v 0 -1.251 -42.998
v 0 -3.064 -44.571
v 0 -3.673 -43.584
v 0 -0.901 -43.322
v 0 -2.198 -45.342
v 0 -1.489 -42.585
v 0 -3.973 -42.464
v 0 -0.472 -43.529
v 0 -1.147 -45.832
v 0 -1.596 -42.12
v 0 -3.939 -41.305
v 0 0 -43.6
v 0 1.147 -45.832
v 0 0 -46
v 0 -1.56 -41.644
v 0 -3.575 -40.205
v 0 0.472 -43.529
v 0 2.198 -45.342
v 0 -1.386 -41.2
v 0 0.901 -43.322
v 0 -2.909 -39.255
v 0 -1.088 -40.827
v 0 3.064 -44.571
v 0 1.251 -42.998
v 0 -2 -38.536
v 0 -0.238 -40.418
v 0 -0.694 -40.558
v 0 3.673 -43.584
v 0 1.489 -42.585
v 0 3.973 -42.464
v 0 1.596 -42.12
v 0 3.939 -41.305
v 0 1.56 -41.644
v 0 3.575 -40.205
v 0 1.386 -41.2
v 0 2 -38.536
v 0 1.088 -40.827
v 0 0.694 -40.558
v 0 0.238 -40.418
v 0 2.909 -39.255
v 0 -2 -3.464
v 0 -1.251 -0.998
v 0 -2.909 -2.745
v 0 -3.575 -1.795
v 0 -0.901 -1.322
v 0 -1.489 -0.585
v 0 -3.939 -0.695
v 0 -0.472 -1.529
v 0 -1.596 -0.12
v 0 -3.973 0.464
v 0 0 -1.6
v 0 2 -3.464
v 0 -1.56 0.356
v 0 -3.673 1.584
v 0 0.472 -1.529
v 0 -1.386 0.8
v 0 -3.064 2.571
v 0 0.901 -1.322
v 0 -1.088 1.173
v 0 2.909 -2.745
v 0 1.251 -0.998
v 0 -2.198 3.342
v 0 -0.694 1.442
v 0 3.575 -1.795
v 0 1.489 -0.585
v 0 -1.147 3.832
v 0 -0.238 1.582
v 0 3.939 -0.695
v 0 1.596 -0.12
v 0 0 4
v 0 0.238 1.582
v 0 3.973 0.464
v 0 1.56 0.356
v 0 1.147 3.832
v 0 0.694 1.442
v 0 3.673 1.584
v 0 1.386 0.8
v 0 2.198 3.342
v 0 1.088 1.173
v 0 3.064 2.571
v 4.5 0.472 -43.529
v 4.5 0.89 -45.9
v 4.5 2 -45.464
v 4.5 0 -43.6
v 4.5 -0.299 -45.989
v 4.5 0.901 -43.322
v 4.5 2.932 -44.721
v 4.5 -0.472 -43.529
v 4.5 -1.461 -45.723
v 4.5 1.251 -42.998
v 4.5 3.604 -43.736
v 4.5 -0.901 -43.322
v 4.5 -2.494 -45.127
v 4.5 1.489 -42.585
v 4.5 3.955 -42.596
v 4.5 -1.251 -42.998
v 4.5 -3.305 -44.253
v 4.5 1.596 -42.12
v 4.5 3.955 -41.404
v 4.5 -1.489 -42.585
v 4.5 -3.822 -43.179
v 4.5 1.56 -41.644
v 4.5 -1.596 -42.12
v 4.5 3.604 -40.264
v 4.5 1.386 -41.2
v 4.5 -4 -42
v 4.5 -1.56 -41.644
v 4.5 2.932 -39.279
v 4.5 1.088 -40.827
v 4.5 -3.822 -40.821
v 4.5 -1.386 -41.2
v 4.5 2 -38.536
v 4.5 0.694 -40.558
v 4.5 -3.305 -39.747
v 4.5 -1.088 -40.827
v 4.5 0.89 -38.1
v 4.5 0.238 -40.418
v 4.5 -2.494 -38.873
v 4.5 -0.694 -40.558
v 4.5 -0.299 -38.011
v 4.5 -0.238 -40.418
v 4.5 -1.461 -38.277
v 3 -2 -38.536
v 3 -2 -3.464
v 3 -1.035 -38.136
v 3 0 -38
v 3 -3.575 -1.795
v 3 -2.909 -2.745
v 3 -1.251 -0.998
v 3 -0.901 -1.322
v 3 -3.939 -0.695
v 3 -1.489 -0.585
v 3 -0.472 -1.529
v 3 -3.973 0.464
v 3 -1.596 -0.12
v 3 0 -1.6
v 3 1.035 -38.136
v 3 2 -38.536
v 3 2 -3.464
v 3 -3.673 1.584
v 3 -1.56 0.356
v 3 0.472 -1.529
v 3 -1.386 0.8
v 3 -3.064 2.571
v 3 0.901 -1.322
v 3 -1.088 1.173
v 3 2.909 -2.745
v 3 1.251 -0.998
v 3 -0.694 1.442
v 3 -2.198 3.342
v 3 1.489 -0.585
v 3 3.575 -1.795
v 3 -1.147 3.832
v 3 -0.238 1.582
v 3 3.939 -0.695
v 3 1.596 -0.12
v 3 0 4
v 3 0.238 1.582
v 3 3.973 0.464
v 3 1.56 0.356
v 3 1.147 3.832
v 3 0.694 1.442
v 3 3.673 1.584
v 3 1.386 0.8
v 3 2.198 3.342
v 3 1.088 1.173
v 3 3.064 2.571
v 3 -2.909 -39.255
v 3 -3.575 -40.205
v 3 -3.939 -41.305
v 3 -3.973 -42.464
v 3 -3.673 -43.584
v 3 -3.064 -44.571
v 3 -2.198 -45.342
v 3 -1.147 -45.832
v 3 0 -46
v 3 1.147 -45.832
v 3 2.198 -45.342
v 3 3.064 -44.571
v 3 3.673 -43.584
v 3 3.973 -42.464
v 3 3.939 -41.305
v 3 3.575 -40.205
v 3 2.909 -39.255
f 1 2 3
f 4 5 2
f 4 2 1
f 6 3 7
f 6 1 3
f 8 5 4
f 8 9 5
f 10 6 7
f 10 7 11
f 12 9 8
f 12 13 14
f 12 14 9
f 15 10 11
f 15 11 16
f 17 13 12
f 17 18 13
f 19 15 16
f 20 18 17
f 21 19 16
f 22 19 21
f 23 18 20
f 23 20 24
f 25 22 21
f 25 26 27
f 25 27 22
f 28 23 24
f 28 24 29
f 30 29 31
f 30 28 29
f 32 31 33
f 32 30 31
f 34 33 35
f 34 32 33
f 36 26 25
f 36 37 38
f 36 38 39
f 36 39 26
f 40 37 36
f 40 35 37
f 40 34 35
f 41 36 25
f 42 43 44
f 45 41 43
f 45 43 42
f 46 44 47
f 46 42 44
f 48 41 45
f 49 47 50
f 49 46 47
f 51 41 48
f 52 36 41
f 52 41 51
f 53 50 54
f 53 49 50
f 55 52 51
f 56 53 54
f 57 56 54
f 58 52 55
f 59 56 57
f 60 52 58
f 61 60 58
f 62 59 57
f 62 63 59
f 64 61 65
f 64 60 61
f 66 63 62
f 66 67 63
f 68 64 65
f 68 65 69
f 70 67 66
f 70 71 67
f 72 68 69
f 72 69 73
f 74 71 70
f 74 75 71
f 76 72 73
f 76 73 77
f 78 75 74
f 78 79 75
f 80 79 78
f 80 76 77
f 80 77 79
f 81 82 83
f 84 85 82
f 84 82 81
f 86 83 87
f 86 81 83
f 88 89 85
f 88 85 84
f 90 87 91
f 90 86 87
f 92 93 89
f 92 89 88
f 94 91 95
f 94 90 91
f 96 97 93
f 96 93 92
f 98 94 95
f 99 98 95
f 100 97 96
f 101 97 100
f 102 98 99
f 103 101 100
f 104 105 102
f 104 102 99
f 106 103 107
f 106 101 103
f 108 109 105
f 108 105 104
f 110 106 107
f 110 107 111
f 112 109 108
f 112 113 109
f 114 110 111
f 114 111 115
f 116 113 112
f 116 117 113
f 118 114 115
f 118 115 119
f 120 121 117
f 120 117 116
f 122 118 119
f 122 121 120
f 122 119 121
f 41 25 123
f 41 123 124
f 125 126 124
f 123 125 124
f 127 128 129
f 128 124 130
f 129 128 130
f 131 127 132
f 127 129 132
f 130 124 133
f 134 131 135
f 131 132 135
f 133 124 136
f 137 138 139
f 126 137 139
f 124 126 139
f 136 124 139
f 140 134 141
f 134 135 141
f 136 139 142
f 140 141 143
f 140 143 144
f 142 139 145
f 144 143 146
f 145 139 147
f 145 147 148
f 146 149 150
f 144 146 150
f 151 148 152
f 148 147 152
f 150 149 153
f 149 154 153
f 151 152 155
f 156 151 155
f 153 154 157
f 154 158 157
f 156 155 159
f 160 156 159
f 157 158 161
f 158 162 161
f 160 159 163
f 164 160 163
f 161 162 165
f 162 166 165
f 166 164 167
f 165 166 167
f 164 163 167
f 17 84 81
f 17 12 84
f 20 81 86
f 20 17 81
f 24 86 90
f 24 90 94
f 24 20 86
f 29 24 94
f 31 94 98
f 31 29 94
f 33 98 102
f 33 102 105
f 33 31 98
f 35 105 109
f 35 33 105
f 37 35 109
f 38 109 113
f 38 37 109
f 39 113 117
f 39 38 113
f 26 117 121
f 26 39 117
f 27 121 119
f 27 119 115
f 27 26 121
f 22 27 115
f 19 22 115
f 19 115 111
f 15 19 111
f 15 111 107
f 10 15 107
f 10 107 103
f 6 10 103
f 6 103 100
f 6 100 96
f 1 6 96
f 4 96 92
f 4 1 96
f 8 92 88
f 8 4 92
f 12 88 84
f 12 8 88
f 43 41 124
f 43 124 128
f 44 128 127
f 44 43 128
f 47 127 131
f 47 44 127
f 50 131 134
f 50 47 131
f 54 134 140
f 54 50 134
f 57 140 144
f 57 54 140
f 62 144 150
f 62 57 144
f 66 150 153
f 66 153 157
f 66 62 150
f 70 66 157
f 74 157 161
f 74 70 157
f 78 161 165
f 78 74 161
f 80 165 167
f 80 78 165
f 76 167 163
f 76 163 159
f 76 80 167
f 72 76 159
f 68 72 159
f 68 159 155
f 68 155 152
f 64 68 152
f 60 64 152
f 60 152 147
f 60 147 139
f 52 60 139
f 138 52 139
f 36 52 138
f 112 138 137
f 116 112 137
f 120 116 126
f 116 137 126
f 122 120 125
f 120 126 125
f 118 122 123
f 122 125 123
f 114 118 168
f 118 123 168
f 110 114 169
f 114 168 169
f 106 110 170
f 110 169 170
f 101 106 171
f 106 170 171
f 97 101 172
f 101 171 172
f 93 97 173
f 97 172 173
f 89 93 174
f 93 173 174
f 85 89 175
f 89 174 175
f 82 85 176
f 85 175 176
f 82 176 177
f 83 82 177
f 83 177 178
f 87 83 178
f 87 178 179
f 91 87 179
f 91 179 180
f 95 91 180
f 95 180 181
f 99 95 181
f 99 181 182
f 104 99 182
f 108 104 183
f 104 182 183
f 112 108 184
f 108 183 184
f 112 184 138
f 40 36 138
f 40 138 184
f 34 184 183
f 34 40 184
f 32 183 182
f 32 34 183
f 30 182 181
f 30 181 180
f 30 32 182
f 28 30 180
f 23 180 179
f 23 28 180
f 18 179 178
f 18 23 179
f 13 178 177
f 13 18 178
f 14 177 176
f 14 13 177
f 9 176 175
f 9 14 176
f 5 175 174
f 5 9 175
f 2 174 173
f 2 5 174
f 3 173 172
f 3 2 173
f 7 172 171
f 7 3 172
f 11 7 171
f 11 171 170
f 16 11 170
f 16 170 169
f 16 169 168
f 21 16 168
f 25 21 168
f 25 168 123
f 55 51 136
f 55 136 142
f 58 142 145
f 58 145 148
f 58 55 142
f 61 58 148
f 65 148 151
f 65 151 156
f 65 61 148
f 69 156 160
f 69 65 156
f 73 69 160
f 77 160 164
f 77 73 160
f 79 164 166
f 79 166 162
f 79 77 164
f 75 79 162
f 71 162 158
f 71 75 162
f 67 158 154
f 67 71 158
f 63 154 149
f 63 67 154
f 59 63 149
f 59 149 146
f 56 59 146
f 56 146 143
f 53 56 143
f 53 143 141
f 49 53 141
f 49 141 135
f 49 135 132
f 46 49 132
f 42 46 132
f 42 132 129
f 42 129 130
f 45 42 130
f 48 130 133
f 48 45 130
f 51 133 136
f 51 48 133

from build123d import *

# Parameters (mm, degrees)
SKETCH1_R           = 1.6
BOSS_EXTRUDE1_DEPTH = 3
SKETCH3_R           = 4
SKETCH3_R_2         = 1.6
BOSS_EXTRUDE3_DEPTH = 1.5


with BuildPart() as part:
    # Sketch1 → Boss-Extrude1 (new body)
    with BuildSketch(Plane(origin=(0, 0, 0), x_dir=(0, 0, -1), z_dir=(1, 0, 0))):
        with BuildLine():
            Line((21, 2), (38.535898385, 2))
            ThreePointArc((38.535898385, 2), (46, 0), (38.535898385, -2))
            Line((38.535898385, -2), (21, -2))
            Line((21, -2), (3.464101615, -2))
            ThreePointArc((3.464101615, -2), (-4, 0), (3.464101615, 2))
            Line((3.464101615, 2), (21, 2))
        make_face()
        Circle(SKETCH1_R, mode=Mode.SUBTRACT)
        with Locations((42, 0)):
            Circle(SKETCH1_R, mode=Mode.SUBTRACT)
    extrude(amount=BOSS_EXTRUDE1_DEPTH)

    # Sketch3 → Boss-Extrude3 (add)
    with BuildSketch(Plane(origin=(3, 0, 0), x_dir=(0, 0, -1), z_dir=(1, 0, 0))):
        with Locations(Location((42, 0, 0), (0, 0, 150))):
            Circle(SKETCH3_R)
        with Locations((42, 0)):
            Circle(SKETCH3_R_2, mode=Mode.SUBTRACT)
    extrude(amount=BOSS_EXTRUDE3_DEPTH)


solid = part.part
